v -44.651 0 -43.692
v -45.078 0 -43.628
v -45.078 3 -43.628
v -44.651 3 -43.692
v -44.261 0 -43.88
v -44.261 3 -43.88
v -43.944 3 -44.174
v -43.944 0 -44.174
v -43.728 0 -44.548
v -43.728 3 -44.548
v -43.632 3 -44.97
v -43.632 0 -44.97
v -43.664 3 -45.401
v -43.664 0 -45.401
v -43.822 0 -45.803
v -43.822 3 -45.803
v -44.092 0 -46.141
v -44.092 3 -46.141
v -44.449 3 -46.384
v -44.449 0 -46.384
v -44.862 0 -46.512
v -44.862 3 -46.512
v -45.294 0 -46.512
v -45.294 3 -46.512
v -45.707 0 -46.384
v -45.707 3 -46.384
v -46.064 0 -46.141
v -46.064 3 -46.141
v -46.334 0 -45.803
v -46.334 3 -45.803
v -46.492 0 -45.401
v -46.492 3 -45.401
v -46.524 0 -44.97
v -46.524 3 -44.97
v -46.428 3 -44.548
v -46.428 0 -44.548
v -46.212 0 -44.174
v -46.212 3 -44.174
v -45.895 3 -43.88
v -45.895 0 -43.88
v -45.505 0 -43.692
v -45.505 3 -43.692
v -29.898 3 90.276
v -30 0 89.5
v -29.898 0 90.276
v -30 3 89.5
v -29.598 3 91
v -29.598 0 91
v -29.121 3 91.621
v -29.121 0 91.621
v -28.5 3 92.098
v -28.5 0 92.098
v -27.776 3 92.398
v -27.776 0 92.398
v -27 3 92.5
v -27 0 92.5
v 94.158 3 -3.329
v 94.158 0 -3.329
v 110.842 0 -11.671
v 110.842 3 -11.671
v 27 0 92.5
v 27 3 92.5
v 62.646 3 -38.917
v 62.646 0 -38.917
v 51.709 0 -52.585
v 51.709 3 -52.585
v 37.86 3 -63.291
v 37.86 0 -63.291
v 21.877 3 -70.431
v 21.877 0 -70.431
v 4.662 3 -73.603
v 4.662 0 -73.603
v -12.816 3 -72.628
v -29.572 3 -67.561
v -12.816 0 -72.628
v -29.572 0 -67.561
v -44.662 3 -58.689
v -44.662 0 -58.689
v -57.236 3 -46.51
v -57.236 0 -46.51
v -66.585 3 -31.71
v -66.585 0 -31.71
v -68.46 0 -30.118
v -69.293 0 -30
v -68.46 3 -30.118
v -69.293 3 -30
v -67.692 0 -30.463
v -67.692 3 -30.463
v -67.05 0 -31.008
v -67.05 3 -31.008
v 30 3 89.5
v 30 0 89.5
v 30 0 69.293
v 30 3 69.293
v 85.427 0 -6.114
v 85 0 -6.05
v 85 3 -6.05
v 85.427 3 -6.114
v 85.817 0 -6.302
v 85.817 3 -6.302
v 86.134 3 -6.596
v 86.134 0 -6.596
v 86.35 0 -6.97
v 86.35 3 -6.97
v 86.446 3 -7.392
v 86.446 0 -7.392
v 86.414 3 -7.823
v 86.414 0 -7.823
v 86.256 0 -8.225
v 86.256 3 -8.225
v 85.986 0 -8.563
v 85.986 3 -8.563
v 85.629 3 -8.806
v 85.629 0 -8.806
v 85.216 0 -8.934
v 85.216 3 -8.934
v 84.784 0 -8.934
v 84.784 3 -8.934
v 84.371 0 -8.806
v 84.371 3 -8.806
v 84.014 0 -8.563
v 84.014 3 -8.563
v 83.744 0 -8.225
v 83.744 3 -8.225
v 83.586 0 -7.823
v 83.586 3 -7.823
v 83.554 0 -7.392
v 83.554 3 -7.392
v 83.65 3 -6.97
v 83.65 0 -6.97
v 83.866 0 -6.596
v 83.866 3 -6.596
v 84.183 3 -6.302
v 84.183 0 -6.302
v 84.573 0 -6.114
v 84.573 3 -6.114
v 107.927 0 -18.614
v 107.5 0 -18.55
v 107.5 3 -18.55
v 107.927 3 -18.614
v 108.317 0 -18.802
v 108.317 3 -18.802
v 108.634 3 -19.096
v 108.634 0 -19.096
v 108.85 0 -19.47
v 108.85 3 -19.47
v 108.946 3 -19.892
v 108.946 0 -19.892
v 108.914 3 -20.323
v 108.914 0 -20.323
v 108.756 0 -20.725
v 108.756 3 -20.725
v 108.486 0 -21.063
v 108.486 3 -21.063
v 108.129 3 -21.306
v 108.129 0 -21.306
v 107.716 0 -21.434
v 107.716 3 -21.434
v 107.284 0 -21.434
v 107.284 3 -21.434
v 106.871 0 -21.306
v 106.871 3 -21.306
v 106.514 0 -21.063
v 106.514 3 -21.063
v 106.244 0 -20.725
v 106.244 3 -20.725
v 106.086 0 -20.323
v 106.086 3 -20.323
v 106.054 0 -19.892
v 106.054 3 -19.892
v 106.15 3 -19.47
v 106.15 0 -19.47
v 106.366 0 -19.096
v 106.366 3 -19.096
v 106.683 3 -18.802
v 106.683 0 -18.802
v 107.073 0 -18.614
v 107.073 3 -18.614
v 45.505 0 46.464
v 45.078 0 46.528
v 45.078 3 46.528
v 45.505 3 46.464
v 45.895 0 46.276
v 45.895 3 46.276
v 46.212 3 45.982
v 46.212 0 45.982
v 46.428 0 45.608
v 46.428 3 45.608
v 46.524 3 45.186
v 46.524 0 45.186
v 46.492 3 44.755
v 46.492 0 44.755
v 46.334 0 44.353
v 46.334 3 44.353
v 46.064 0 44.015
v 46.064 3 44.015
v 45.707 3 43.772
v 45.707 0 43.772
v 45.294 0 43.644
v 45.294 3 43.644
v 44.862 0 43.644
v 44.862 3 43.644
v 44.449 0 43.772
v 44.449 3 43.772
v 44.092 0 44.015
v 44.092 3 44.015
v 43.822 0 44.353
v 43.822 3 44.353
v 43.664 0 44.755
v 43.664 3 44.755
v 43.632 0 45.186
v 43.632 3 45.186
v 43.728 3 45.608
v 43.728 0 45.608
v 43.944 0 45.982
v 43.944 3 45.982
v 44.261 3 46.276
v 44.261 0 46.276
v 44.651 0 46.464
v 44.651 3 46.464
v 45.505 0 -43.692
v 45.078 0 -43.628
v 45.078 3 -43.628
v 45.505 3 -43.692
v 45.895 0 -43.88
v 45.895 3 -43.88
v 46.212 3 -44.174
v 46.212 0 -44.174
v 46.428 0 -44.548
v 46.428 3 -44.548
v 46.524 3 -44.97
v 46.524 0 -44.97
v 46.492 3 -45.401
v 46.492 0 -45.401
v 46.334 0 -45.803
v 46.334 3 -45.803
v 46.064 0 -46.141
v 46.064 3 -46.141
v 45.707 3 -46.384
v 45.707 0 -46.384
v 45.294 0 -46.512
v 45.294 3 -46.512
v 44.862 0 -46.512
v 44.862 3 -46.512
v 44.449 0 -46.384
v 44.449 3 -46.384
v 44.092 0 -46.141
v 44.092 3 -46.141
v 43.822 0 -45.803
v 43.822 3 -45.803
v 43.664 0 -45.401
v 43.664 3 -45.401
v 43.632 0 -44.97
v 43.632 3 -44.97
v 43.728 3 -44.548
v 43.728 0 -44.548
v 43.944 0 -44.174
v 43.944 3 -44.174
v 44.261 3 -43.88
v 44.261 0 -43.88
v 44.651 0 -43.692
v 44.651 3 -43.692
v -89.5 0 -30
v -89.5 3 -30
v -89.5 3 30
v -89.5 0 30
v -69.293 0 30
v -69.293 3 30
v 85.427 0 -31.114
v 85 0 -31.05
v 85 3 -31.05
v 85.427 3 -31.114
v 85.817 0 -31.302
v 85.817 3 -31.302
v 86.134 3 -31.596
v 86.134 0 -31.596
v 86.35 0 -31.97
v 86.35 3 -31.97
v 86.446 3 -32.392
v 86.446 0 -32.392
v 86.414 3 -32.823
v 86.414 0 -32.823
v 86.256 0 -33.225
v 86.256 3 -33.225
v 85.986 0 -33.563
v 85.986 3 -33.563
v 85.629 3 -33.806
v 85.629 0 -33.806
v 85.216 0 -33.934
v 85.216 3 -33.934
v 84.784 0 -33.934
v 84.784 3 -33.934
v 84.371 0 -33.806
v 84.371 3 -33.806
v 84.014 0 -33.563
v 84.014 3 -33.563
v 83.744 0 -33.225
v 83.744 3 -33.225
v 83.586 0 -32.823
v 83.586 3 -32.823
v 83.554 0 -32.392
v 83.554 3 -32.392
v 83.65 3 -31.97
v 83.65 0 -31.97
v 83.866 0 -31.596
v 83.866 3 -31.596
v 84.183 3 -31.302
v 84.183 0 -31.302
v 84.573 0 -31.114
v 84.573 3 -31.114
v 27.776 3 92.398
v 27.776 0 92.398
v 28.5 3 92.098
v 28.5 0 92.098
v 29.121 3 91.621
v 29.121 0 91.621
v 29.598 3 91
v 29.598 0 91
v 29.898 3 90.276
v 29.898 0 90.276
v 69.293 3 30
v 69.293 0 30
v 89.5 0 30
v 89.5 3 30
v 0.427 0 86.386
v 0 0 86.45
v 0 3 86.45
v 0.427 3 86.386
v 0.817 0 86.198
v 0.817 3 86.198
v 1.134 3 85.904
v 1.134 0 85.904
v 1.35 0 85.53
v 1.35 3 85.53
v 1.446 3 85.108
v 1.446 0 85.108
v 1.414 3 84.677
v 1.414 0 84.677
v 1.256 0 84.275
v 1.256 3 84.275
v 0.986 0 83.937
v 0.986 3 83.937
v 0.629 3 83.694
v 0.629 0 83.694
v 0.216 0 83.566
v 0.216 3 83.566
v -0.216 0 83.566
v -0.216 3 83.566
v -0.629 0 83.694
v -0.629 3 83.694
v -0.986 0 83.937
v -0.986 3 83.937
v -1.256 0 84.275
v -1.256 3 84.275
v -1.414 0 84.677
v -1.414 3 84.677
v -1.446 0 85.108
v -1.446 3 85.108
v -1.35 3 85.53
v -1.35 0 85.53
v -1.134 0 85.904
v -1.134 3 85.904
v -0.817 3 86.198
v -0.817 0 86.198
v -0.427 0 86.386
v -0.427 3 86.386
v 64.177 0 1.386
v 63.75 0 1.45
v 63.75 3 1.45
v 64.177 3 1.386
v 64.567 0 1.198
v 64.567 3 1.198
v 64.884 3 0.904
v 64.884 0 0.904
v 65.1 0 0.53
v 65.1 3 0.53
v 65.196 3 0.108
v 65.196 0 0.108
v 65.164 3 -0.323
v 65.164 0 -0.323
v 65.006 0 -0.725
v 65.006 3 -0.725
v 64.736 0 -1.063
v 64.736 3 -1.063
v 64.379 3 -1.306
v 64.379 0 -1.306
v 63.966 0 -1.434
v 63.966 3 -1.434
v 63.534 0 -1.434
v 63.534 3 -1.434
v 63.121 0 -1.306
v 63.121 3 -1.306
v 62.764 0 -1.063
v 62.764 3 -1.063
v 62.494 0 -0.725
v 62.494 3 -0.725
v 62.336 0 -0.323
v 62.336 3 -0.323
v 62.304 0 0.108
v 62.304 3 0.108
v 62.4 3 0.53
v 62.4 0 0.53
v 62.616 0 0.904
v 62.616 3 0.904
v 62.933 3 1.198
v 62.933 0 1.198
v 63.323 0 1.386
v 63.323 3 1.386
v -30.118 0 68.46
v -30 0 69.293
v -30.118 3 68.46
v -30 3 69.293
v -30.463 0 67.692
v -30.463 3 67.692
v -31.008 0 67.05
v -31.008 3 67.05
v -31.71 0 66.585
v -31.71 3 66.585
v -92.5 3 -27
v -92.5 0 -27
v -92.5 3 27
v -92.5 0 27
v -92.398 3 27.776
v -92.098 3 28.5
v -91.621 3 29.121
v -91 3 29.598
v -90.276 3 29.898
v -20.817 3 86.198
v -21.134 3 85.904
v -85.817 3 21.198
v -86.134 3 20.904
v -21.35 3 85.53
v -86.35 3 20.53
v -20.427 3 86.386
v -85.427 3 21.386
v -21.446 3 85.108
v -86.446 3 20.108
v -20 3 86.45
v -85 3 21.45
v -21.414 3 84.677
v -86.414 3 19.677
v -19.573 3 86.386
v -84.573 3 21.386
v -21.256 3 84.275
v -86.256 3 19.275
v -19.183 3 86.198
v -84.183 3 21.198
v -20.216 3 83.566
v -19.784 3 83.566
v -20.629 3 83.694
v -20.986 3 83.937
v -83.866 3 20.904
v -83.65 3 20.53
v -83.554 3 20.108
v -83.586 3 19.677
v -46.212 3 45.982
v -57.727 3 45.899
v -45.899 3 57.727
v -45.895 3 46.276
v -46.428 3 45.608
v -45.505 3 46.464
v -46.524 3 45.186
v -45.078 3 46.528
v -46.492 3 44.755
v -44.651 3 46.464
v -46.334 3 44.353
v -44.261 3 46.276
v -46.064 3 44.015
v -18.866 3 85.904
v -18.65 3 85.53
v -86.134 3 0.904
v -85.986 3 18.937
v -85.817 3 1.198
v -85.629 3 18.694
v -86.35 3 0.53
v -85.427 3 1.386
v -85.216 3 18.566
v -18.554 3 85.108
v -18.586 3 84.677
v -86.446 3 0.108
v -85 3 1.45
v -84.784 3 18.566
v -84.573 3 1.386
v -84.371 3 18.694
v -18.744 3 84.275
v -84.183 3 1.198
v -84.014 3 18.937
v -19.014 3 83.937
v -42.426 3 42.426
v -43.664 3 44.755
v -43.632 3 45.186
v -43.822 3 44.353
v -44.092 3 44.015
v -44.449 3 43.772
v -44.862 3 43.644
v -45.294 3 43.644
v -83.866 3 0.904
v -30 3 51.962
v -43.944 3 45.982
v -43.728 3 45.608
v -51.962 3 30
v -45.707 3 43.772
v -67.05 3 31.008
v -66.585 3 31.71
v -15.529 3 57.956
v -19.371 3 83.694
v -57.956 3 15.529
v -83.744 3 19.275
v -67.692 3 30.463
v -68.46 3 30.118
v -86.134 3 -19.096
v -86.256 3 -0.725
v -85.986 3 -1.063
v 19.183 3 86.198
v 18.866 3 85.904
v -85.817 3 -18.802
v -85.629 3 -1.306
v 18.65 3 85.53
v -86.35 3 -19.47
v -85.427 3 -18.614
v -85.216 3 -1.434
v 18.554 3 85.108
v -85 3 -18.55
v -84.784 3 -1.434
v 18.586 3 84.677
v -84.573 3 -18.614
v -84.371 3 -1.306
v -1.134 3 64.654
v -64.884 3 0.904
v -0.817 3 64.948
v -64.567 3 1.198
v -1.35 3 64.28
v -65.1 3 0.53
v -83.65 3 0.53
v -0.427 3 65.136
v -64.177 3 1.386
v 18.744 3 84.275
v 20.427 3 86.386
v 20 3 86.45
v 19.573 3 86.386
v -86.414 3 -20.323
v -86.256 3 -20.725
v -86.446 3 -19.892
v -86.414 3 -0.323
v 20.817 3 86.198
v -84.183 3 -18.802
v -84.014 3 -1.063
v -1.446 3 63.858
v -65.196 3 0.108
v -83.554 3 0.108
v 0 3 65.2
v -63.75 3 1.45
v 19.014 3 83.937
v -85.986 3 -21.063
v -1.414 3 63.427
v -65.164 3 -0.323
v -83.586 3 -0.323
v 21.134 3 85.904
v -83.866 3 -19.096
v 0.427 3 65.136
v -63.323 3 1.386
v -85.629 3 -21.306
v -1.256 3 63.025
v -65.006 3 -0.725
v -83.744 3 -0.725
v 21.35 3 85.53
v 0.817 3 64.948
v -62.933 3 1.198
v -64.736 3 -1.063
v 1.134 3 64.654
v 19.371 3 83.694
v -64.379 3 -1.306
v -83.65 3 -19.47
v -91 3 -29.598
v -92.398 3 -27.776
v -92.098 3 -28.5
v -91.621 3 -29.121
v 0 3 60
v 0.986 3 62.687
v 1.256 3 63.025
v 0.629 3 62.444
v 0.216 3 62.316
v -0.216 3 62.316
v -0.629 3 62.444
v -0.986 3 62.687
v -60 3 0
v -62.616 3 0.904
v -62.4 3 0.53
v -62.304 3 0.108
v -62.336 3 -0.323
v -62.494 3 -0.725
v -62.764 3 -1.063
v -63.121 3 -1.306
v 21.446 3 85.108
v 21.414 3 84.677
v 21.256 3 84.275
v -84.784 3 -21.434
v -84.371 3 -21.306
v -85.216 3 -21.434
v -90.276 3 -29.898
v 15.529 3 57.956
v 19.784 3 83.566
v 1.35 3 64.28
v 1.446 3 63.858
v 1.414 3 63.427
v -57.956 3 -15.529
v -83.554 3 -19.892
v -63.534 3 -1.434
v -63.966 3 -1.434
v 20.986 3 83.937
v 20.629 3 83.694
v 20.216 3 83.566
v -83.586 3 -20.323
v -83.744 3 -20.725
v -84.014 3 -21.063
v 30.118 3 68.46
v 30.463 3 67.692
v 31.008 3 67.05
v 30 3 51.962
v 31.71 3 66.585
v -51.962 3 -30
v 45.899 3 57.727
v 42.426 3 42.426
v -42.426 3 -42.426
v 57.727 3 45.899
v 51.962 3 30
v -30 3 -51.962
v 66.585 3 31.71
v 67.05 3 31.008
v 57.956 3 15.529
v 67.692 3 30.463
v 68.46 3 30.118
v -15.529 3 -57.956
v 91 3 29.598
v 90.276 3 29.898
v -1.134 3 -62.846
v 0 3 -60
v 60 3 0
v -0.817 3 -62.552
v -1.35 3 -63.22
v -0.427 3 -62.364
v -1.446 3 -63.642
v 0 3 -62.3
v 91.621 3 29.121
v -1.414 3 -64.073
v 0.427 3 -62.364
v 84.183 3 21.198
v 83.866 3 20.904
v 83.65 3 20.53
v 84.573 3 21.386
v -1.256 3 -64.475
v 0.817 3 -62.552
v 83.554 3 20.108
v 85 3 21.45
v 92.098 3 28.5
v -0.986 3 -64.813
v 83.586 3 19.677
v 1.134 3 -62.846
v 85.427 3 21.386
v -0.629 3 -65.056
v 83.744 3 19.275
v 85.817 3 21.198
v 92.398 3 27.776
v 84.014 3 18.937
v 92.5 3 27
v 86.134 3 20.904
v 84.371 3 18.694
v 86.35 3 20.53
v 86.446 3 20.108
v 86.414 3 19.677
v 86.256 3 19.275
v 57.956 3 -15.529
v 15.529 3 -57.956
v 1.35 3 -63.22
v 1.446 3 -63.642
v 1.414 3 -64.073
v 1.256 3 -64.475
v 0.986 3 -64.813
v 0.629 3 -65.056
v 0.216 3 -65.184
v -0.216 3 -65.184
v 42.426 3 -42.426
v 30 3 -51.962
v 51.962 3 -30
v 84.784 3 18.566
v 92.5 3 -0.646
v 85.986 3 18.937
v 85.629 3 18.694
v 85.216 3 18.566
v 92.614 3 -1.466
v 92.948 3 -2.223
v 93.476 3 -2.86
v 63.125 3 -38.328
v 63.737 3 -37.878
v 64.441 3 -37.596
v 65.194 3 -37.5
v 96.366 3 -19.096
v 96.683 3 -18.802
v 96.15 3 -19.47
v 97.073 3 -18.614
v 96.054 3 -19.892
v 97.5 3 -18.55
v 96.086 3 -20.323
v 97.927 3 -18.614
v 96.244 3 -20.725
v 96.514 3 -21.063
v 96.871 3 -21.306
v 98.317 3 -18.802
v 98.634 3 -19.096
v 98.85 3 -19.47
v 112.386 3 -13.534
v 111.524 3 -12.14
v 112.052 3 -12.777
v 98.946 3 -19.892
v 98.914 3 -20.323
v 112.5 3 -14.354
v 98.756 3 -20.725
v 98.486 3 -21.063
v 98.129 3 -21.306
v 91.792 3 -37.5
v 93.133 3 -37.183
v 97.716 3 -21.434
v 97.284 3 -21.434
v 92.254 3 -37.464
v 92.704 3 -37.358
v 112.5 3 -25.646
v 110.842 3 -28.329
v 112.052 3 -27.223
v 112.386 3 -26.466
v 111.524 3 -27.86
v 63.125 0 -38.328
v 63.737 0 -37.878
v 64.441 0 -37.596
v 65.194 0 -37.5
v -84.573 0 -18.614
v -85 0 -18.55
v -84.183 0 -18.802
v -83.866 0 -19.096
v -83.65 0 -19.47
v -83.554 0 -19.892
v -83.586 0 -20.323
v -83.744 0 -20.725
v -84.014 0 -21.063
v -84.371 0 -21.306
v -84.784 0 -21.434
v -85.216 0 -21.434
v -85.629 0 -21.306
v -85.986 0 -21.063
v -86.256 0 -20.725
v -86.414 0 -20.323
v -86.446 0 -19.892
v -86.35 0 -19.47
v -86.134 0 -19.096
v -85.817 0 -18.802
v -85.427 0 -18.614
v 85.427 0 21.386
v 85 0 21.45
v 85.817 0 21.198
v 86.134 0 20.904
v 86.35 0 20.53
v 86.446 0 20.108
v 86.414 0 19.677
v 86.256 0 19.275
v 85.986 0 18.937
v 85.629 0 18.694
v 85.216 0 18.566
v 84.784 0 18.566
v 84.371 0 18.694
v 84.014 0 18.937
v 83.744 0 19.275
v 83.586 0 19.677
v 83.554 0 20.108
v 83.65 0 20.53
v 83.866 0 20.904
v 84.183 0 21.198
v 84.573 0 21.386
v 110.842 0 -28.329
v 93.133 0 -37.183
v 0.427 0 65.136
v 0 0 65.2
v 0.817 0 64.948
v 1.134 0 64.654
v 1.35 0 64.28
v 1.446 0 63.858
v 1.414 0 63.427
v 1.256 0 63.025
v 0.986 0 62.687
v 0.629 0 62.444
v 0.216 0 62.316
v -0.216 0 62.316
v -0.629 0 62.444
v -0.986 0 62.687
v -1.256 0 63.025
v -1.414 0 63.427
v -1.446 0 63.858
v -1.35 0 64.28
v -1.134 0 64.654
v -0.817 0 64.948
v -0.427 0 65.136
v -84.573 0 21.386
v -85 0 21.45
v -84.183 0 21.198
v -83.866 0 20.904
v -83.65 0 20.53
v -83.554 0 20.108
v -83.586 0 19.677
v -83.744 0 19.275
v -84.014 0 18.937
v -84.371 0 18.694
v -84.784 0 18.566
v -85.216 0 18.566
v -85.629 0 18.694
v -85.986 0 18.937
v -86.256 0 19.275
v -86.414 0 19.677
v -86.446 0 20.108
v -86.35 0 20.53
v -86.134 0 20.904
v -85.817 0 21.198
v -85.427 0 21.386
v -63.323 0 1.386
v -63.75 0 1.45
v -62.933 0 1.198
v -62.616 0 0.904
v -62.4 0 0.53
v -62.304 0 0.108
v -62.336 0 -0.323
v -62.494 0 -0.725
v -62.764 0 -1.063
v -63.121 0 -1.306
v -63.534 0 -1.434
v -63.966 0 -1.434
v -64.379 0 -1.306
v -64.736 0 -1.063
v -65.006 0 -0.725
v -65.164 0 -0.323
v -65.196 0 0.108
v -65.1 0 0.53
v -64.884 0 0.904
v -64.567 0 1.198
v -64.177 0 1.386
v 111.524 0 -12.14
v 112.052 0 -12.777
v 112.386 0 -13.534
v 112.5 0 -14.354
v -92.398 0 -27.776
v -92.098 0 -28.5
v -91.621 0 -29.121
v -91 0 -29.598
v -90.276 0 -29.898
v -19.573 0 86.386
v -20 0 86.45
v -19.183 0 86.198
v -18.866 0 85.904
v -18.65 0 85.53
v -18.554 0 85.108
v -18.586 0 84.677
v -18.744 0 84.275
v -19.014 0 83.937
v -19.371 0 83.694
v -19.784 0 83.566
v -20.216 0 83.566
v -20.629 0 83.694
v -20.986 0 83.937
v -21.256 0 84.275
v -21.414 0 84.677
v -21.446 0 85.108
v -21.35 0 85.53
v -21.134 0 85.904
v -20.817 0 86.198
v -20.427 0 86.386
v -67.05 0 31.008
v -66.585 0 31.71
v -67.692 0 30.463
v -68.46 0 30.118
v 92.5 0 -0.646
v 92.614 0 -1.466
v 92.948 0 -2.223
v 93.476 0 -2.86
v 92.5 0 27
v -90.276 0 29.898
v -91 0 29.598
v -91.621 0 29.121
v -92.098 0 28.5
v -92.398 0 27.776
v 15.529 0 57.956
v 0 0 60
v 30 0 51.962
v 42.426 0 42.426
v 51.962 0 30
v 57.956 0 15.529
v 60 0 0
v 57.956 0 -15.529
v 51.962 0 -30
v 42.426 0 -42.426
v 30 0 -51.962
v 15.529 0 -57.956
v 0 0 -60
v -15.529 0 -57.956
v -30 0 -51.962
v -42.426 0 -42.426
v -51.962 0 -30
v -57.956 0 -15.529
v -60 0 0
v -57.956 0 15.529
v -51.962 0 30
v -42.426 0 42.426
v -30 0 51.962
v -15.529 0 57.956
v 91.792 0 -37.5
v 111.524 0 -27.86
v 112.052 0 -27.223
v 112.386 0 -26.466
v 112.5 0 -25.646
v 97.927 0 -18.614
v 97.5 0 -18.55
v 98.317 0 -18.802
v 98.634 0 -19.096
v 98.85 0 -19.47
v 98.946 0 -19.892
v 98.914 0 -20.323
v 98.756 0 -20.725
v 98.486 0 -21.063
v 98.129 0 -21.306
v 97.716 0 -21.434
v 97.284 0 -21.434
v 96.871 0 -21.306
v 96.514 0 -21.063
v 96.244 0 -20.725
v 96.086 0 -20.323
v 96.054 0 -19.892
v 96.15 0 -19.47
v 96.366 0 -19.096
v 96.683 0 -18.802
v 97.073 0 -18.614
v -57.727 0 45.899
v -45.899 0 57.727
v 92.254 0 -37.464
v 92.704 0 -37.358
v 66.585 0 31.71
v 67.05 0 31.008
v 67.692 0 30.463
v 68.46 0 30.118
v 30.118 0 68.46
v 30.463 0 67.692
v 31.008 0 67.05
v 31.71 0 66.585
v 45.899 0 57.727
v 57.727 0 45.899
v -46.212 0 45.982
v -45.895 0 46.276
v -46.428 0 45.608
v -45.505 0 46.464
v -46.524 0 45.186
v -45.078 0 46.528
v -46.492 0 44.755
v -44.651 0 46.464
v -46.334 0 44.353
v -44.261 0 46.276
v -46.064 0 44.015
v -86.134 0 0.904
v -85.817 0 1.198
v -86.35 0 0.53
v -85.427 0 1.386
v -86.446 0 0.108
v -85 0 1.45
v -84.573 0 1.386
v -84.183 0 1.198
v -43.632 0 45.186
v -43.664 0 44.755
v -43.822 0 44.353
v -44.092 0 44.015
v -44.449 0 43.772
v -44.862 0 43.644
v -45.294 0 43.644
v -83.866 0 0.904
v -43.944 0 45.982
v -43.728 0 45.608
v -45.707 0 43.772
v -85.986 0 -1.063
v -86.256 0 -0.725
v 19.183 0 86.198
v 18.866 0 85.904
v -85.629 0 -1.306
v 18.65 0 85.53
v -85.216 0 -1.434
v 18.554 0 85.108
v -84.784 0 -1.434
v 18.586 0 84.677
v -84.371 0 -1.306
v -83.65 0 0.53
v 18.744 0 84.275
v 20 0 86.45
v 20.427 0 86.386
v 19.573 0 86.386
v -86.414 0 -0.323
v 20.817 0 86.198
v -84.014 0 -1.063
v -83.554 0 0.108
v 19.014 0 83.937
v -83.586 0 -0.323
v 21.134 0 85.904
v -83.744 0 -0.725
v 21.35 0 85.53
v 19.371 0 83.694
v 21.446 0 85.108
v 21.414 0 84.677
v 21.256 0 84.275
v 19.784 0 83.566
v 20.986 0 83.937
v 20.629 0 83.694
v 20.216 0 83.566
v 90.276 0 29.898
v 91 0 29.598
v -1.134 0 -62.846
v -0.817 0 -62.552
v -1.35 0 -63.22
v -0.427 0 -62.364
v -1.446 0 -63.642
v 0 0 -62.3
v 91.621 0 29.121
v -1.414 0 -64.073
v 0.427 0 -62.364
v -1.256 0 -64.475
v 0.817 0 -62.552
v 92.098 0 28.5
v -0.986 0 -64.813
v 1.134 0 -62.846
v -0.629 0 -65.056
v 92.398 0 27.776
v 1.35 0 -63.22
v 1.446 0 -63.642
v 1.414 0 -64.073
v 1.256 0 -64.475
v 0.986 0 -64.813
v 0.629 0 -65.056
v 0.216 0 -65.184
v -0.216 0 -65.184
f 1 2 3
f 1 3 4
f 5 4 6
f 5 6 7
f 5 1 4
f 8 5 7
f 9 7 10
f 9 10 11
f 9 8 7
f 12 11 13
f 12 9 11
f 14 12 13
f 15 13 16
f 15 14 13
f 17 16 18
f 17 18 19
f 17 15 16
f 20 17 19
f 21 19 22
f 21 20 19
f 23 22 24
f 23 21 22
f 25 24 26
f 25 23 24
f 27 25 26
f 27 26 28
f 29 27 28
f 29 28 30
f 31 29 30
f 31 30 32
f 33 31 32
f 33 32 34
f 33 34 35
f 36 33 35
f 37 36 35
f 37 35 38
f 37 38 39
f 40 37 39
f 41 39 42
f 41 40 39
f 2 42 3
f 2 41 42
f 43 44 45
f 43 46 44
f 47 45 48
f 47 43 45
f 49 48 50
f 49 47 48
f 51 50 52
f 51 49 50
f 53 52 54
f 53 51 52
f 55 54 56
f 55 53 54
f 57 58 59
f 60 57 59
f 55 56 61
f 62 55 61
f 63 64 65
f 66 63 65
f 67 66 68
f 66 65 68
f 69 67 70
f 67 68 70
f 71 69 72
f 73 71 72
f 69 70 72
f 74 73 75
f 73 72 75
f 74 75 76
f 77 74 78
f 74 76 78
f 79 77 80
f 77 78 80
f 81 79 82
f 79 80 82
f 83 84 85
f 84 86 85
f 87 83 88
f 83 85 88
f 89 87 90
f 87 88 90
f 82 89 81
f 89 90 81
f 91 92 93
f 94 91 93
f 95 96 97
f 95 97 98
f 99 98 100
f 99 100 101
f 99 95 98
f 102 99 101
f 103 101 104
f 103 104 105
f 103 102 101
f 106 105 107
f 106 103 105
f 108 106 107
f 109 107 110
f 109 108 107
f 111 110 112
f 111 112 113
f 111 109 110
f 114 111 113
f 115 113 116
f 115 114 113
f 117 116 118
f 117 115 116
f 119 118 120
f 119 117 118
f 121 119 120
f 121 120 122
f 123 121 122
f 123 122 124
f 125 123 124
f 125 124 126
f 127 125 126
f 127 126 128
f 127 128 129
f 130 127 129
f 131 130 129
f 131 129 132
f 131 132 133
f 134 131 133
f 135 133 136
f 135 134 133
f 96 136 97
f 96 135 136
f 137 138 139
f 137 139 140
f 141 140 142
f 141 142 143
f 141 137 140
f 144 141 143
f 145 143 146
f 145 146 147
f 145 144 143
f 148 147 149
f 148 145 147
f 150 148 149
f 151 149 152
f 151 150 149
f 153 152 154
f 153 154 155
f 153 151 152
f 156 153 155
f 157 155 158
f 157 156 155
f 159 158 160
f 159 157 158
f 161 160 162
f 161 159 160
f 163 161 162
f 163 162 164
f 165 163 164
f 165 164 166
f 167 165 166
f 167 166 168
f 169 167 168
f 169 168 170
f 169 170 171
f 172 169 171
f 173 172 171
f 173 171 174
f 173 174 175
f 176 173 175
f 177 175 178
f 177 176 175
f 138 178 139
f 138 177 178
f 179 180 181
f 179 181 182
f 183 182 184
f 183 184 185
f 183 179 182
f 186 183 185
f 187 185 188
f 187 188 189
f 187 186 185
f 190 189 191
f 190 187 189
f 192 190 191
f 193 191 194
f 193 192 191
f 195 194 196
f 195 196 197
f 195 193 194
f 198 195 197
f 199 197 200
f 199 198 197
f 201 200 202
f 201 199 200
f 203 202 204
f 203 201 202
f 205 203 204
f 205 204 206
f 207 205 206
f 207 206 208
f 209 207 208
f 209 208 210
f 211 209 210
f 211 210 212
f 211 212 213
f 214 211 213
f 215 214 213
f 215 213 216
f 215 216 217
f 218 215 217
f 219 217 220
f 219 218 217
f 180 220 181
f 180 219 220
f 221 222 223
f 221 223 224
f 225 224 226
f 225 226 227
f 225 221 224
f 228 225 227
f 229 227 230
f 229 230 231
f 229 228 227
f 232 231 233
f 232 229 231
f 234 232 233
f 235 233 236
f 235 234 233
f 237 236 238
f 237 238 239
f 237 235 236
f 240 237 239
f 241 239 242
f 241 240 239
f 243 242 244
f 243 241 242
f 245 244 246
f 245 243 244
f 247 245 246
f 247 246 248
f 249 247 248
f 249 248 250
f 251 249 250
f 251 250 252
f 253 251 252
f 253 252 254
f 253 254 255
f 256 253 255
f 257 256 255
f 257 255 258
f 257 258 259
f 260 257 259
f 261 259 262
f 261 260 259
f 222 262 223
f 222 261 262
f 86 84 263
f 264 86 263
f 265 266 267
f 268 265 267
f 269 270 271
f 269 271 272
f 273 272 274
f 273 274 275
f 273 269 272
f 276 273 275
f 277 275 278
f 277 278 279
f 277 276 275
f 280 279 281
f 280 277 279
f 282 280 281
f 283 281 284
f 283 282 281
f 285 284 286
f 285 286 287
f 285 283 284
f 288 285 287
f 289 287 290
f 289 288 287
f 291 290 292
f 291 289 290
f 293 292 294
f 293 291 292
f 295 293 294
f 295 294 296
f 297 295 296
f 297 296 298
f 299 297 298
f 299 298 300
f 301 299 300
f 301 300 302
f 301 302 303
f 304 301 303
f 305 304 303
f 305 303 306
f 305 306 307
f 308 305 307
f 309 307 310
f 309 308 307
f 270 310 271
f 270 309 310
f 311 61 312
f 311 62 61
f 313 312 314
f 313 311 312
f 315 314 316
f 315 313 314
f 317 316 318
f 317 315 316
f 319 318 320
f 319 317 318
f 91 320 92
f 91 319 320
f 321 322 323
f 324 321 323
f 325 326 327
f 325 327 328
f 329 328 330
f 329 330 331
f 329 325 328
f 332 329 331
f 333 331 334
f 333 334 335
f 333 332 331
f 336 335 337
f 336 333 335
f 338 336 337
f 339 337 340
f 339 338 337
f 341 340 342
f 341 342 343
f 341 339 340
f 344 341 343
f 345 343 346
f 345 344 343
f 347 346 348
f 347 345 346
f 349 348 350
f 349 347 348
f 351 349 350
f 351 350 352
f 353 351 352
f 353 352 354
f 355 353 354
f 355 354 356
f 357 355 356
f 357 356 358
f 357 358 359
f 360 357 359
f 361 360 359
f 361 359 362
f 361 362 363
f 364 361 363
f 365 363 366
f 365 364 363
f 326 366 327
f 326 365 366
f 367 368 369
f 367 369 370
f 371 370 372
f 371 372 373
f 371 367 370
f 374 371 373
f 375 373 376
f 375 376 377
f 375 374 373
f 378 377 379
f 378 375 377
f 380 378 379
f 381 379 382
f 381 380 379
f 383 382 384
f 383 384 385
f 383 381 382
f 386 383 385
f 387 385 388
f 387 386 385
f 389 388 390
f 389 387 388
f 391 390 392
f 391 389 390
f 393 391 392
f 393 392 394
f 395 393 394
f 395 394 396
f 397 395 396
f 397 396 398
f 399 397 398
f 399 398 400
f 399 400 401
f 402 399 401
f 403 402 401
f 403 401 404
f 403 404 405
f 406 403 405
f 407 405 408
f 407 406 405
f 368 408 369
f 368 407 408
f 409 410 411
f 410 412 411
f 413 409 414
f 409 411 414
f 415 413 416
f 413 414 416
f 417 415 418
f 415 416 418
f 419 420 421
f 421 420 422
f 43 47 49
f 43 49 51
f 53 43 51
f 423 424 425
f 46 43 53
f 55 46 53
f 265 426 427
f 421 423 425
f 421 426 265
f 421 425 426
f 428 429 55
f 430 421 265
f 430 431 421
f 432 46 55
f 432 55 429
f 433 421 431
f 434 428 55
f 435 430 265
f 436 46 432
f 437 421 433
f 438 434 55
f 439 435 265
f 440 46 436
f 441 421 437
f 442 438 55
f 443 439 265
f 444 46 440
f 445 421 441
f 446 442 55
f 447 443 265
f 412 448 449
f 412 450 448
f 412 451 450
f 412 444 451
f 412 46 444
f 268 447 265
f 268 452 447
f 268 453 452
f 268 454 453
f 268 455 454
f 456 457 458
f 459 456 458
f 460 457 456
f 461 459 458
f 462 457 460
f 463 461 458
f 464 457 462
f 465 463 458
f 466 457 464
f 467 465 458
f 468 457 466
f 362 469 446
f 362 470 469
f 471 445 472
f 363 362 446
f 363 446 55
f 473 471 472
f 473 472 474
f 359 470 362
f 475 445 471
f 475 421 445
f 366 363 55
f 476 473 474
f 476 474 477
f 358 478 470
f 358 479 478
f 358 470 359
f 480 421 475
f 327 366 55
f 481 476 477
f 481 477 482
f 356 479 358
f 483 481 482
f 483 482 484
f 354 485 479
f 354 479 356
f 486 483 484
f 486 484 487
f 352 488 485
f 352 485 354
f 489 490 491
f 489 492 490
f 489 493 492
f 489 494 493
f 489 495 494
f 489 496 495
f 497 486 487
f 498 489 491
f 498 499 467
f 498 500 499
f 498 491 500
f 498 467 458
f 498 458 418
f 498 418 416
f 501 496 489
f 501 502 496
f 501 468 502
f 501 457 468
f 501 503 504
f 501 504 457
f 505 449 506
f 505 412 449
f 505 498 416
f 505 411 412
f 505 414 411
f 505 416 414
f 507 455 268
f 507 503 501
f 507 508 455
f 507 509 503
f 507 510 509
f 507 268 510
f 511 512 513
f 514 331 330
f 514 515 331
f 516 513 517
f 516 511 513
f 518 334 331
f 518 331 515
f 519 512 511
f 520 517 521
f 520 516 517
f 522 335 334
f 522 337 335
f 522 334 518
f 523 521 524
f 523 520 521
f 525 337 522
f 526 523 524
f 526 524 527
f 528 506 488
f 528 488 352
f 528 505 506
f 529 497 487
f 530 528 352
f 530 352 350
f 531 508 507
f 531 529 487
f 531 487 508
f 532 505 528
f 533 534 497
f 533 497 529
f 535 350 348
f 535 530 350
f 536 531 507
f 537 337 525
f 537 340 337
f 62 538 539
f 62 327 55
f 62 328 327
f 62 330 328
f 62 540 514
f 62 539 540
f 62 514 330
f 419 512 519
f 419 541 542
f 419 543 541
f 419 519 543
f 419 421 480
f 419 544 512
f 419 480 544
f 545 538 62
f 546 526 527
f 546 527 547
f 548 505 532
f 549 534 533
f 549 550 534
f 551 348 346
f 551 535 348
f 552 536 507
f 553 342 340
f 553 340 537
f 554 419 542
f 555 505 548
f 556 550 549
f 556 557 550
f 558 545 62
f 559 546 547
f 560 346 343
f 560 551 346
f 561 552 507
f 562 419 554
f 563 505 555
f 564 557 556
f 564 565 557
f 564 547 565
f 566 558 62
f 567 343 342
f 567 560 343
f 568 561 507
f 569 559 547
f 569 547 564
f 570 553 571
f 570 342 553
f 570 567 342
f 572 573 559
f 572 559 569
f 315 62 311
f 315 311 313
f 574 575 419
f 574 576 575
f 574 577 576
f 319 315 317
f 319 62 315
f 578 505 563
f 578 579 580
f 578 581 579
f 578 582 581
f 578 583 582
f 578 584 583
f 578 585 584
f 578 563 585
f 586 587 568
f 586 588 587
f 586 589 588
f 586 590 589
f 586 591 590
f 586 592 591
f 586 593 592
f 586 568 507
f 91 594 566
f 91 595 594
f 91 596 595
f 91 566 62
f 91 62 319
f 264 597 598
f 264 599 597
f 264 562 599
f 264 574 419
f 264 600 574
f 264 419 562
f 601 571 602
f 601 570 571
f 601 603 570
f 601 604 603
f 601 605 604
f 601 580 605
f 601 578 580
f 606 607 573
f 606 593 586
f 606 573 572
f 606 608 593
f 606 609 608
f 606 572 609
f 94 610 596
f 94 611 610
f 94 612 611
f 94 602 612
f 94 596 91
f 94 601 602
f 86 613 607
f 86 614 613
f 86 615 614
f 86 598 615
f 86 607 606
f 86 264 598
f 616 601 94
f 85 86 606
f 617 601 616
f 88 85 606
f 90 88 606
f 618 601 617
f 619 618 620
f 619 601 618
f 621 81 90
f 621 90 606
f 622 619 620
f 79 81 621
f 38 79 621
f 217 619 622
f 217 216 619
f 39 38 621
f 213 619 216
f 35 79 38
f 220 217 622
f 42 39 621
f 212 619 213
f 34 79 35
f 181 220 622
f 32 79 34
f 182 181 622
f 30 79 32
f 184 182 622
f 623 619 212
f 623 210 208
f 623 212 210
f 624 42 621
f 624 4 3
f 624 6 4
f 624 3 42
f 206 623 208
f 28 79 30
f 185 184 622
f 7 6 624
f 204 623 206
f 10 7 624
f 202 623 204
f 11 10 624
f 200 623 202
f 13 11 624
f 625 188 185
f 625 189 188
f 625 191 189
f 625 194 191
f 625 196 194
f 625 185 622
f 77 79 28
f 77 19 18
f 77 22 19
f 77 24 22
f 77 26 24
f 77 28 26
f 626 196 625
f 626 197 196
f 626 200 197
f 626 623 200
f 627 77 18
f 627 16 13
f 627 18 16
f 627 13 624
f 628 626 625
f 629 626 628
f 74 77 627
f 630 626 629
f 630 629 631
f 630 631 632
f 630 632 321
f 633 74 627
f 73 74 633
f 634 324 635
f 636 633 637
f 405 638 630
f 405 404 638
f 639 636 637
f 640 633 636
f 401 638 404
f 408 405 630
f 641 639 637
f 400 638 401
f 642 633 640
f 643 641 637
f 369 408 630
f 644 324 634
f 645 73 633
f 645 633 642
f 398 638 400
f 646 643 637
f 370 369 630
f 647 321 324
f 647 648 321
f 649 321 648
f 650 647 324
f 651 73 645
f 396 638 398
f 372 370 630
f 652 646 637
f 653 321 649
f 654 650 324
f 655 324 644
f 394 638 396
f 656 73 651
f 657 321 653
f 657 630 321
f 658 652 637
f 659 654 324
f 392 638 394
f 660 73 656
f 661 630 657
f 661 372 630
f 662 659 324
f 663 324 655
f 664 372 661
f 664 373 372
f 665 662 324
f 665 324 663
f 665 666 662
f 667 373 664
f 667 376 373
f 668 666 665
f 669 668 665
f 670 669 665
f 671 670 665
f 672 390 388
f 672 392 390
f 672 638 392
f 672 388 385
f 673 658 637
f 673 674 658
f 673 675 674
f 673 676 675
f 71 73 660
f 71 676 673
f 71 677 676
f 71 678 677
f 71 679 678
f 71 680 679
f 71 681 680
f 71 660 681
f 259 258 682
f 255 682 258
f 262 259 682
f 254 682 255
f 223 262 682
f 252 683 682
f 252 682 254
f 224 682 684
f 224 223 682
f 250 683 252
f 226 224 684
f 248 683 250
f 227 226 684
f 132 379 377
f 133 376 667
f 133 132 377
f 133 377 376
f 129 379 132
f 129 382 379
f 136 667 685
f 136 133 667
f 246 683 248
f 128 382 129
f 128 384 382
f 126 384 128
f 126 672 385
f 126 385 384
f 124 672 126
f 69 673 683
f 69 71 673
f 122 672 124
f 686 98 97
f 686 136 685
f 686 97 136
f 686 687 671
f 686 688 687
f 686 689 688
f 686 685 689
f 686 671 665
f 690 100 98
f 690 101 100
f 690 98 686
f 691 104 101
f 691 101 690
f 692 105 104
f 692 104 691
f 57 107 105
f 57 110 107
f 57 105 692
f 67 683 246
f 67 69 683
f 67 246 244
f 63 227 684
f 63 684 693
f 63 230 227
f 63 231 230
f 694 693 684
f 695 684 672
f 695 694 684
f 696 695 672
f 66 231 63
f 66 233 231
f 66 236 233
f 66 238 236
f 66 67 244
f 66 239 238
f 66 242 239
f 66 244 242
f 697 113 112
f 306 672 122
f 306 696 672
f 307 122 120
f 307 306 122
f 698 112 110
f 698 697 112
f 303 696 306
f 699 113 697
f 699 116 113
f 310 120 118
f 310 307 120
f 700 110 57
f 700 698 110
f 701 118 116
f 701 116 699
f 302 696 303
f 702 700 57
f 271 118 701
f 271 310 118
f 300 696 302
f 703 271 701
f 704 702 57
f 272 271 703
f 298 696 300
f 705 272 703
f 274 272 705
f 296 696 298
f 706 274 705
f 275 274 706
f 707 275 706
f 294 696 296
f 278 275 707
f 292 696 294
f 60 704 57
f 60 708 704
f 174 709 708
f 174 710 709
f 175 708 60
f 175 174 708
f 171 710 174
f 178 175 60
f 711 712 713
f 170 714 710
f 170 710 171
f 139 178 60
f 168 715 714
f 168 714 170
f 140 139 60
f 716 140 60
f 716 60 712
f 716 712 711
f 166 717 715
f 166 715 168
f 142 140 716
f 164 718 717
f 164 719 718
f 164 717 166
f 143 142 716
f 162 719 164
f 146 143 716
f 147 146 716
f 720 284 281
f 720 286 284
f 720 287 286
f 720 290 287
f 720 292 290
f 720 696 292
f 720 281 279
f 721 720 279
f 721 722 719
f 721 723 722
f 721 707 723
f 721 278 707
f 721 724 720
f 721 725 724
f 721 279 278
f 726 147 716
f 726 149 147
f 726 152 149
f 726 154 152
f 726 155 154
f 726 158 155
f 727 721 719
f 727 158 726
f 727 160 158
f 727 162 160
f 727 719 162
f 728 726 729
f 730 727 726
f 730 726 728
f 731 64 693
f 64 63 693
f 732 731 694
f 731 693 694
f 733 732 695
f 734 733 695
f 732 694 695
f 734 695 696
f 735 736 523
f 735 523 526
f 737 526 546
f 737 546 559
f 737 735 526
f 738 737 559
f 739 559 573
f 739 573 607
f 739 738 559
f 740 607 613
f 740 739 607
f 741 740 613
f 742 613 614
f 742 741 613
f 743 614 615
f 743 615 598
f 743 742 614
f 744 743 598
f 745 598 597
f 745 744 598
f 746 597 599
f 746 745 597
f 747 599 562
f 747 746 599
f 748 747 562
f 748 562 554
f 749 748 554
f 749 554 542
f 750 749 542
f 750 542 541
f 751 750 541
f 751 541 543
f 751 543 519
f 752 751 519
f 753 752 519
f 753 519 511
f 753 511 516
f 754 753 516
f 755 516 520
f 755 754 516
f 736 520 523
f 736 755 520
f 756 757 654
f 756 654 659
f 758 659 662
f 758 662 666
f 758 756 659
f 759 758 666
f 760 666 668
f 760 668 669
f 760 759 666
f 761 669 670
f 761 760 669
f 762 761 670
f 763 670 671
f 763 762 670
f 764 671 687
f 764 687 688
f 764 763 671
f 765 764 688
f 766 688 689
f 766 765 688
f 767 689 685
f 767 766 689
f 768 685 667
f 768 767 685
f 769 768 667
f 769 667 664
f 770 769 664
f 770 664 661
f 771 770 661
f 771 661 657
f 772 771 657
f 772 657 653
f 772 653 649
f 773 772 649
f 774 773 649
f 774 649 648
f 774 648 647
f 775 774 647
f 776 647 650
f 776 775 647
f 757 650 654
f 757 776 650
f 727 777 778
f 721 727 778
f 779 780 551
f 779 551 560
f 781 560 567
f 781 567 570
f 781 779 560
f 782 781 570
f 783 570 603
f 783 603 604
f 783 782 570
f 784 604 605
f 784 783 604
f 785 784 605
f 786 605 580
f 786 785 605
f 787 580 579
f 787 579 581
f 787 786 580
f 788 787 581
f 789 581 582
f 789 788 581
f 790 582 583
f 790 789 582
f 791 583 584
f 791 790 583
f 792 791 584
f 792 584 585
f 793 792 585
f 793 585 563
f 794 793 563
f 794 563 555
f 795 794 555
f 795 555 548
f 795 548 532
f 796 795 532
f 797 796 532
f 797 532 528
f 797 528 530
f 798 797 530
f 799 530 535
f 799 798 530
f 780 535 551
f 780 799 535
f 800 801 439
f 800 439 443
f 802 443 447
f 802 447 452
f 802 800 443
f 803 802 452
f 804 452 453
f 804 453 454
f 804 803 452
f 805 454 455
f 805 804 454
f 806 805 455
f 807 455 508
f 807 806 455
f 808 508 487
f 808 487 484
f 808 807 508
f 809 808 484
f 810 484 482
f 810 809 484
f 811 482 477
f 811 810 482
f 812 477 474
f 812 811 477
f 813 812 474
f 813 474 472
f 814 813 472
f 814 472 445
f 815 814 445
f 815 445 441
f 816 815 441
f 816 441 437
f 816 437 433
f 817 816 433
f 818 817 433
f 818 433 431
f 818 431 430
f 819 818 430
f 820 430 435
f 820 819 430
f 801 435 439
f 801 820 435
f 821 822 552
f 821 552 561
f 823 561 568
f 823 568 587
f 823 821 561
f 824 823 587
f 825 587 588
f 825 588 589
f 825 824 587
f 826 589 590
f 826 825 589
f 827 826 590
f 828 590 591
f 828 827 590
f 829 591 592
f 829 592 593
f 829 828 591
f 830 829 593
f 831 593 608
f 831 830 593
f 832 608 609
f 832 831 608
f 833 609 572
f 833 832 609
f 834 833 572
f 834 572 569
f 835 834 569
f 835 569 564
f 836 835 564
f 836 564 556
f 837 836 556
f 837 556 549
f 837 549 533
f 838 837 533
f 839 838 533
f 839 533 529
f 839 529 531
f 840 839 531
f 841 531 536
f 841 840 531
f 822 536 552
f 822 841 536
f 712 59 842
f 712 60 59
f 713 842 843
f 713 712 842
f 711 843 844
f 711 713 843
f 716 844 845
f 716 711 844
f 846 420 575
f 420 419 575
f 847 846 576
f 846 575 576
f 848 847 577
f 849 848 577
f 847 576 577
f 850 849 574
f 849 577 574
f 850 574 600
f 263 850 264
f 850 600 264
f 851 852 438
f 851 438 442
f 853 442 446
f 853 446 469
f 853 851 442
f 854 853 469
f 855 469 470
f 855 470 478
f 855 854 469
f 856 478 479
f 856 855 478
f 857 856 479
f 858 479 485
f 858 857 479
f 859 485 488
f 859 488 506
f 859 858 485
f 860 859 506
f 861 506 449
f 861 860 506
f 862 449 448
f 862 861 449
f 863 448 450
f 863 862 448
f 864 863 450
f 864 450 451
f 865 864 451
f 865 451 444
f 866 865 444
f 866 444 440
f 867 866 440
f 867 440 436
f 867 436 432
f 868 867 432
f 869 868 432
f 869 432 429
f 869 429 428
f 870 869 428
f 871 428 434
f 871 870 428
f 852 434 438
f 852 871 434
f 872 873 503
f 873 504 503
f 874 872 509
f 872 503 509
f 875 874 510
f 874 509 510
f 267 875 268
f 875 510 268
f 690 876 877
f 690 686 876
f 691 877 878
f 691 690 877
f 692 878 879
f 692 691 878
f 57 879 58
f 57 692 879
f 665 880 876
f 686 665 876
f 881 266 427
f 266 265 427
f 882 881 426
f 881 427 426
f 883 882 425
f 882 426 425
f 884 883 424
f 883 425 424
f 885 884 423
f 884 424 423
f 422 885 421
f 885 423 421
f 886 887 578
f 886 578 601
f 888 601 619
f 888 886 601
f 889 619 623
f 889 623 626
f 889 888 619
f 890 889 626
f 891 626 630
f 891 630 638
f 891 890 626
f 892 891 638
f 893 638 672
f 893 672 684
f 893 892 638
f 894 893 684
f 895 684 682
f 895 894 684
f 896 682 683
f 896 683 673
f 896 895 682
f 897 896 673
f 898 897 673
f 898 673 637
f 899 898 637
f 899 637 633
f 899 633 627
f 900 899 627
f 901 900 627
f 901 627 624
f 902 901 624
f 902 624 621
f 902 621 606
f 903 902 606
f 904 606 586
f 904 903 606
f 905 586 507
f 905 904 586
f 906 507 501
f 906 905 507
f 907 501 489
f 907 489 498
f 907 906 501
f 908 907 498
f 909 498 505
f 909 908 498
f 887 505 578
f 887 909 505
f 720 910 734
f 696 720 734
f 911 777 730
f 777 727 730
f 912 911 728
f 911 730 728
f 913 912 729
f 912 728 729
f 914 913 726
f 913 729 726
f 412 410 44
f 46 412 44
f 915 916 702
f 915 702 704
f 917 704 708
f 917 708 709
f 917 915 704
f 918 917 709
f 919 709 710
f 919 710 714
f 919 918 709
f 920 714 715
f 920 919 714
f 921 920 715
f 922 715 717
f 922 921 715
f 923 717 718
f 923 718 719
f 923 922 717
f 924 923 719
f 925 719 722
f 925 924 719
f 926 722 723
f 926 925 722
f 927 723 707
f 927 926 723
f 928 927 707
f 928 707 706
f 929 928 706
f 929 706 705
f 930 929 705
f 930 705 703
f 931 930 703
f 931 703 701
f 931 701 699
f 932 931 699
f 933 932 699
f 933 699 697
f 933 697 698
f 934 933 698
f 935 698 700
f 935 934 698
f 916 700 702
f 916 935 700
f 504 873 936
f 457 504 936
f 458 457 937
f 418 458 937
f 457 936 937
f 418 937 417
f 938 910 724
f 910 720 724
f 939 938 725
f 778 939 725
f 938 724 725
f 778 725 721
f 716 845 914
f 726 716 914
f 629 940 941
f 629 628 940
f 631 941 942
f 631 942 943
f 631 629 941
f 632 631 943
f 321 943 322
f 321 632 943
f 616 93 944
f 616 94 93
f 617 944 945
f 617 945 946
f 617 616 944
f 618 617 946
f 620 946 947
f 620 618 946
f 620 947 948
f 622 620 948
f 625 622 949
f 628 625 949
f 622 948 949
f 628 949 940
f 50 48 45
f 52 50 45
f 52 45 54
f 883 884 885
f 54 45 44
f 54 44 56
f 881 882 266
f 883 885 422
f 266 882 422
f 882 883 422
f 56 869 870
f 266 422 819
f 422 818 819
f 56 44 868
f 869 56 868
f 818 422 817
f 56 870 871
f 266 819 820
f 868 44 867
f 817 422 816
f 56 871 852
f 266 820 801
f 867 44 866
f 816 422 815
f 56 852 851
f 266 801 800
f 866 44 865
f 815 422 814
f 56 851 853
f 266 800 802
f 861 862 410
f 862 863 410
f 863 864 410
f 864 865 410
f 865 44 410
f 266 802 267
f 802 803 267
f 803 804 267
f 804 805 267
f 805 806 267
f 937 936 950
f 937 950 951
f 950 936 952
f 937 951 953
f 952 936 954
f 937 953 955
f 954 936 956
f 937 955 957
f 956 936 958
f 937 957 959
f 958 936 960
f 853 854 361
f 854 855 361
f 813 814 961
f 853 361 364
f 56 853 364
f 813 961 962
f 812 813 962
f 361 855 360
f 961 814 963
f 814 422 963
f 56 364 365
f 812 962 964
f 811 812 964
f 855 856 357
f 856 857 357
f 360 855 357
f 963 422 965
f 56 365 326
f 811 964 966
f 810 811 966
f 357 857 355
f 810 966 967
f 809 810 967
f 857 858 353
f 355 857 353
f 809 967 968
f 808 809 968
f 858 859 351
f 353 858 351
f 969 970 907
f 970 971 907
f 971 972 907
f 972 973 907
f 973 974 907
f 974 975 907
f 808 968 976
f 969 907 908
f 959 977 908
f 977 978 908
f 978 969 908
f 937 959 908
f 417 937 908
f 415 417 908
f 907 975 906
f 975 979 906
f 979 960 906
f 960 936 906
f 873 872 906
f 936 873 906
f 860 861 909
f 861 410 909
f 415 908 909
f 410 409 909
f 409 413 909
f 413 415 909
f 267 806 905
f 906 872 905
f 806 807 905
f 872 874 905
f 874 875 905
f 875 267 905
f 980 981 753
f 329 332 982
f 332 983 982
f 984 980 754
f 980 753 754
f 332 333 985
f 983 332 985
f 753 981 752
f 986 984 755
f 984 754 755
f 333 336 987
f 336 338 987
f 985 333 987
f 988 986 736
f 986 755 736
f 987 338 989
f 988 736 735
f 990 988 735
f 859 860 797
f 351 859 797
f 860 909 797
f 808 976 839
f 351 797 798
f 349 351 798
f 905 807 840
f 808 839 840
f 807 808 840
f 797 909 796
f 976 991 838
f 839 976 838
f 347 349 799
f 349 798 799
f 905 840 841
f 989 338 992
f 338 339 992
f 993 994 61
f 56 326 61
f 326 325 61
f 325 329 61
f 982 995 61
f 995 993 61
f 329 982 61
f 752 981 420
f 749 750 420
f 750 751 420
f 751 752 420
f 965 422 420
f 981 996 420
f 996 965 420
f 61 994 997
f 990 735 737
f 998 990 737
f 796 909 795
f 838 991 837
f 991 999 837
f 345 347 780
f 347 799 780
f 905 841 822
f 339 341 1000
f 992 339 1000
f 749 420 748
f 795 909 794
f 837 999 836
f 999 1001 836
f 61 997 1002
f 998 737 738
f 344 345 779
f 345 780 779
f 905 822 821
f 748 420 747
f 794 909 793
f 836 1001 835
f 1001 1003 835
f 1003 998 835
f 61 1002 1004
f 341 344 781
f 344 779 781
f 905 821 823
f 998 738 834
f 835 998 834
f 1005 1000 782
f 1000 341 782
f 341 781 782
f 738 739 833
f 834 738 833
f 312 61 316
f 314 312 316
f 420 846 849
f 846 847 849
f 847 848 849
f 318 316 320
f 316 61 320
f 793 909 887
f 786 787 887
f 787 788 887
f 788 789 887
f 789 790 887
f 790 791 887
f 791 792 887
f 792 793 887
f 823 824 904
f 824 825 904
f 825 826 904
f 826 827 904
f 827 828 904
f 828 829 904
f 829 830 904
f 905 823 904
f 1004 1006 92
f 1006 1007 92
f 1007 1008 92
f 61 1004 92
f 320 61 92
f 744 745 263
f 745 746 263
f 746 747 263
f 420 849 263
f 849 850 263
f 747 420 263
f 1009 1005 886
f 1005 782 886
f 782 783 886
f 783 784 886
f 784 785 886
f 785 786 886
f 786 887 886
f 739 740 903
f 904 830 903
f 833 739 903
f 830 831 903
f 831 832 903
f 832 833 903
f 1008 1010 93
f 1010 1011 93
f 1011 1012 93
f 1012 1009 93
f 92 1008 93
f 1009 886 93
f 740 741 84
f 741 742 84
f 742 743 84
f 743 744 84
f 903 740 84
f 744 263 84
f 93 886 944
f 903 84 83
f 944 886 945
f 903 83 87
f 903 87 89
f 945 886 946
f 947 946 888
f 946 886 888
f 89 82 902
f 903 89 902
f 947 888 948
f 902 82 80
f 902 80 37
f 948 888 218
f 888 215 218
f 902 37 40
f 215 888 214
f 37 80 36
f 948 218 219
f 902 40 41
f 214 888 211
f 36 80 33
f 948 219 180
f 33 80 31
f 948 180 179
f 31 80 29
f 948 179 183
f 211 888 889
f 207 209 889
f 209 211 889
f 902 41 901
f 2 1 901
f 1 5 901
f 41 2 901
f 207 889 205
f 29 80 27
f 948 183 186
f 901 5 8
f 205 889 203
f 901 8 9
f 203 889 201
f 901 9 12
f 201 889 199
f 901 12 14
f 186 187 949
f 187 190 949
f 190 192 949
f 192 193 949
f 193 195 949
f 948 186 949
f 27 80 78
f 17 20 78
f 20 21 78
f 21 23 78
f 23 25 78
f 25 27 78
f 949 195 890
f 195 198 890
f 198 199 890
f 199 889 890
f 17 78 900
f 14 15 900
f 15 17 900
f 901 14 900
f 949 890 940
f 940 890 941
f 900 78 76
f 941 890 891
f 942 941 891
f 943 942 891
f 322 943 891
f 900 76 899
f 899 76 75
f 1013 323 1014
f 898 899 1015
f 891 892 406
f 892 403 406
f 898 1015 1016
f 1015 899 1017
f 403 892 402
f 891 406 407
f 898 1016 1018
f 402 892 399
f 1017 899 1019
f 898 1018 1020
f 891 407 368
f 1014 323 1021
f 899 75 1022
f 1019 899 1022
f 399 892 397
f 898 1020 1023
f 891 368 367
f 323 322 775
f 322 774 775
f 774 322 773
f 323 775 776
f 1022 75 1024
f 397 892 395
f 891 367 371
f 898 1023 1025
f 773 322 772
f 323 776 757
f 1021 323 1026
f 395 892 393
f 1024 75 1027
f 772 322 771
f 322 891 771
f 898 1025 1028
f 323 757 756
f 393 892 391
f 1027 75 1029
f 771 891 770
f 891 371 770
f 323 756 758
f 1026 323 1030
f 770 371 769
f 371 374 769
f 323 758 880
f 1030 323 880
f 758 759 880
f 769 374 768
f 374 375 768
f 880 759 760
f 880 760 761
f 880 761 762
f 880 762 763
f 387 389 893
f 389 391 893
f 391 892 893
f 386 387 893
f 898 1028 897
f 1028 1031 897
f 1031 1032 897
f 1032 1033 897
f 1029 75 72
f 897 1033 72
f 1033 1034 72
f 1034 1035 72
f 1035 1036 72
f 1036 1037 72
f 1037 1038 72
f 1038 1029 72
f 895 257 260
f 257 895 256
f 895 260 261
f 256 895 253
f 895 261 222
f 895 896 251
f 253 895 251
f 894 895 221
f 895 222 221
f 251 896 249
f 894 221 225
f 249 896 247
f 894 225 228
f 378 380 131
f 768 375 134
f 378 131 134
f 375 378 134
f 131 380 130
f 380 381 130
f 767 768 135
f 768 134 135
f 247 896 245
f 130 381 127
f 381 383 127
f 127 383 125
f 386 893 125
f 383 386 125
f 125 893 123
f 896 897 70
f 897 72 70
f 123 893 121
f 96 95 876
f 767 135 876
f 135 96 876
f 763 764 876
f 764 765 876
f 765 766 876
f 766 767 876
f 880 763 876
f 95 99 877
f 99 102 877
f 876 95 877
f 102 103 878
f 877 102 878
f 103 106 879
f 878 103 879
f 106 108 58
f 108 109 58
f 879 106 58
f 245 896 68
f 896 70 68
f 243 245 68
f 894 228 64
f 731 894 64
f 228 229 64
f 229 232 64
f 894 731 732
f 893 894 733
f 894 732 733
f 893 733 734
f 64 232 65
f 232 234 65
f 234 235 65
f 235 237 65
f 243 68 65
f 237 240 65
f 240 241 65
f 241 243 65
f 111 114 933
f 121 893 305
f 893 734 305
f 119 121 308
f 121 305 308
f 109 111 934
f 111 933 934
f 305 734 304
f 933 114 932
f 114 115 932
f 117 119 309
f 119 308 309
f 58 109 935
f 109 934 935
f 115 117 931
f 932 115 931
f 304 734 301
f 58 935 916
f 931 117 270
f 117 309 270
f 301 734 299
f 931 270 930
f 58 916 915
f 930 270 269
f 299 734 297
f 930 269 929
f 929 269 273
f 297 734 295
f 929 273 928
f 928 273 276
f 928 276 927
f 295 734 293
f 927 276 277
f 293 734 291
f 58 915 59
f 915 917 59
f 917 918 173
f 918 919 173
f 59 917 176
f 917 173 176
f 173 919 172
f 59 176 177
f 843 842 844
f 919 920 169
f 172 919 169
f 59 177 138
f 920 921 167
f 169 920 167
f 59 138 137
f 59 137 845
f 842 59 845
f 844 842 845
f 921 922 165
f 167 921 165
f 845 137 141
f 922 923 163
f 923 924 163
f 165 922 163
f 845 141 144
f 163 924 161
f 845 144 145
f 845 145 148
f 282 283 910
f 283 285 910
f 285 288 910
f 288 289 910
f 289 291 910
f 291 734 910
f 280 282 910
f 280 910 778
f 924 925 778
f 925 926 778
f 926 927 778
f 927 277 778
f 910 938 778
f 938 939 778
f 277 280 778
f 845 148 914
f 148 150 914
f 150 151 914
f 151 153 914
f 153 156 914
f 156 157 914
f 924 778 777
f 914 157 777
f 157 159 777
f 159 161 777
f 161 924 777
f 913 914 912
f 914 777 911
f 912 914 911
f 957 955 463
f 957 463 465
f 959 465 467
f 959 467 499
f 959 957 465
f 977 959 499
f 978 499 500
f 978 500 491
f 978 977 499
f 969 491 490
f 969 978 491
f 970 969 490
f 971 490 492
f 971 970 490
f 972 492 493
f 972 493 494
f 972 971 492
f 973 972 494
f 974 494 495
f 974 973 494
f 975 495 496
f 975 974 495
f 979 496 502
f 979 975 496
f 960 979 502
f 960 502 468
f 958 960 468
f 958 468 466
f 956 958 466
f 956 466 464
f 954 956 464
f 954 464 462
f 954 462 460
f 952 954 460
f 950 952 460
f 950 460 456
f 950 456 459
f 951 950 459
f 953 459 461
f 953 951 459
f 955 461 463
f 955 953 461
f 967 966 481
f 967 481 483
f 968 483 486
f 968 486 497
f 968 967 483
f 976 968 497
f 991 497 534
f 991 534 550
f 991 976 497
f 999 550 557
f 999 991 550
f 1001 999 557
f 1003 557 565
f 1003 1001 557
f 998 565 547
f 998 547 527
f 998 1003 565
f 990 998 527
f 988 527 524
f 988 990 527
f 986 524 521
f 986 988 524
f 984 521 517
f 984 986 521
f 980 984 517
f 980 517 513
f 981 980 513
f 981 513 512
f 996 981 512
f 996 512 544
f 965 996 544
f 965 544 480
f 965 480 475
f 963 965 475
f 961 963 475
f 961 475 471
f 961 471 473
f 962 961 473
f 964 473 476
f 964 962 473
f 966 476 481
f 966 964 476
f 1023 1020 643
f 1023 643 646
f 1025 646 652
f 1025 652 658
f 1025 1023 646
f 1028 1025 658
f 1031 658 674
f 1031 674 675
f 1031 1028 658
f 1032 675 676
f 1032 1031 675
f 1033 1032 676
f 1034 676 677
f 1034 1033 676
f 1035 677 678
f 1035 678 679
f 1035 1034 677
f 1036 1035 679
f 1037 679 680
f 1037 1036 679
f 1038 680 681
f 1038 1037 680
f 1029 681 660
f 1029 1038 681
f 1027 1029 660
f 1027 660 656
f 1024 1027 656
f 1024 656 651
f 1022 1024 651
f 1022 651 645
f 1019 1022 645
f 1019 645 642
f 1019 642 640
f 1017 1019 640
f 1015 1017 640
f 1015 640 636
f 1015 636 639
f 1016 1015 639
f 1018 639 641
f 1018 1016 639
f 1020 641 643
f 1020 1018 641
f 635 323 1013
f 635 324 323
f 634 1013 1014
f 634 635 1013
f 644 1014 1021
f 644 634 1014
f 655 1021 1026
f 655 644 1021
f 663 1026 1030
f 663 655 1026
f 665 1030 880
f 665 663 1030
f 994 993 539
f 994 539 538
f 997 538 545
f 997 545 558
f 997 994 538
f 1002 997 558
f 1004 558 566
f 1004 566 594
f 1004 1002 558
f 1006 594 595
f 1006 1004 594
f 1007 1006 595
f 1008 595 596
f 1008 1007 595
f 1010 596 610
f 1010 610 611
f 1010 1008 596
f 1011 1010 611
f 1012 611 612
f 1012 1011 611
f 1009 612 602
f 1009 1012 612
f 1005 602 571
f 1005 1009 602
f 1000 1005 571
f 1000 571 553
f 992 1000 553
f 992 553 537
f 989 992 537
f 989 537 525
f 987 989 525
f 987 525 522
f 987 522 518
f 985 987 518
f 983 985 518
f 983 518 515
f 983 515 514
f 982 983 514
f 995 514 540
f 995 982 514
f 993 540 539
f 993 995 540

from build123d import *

# Parameters (mm, degrees)
SKETCH_1_R      = 1.45
SKETCH_1_R_2    = 60
EXTRUDE_1_DEPTH = 3
FILLET_2_R      = 3


with BuildPart() as part:
    # 草图1 → 凸台-拉伸1 (new body)
    with BuildSketch(Plane(origin=(0, 0, 0), x_dir=(1, 0, 0), z_dir=(0, 1, 0))):
        with BuildLine():
            Line((-30, -67.372564891), (-30, -92.5))
            Line((-30, -92.5), (30, -92.5))
            Line((30, -92.5), (30, -67.372564891))
            ThreePointArc((30, -67.372564891), (52.149125113, -52.149125113), (67.372564891, -30))
            Line((67.372564891, -30), (92.5, -30))
            Line((92.5, -30), (92.5, 2.5))
            Line((92.5, 2.5), (112.5, 12.5))
            Line((112.5, 12.5), (112.5, 27.5))
            Line((112.5, 27.5), (92.5, 37.5))
            Line((92.5, 37.5), (63.504428979, 37.5))
            ThreePointArc((63.504428979, 37.5), (-4.219374226, 73.629201959), (-67.372564891, 30))
            Line((-67.372564891, 30), (-92.5, 30))
            Line((-92.5, 30), (-92.5, -30))
            Line((-92.5, -30), (-67.372564891, -30))
            ThreePointArc((-67.372564891, -30), (-52.149125113, -52.149125113), (-30, -67.372564891))
        make_face()
        with Locations(Location((-20, -85, 0), (0, 0, 270))):
            Circle(SKETCH_1_R, mode=Mode.SUBTRACT)
        with Locations(Location((0, -85, 0), (0, 0, 270))):
            Circle(SKETCH_1_R, mode=Mode.SUBTRACT)
        with Locations(Location((0, -63.75, 0), (0, 0, 270))):
            Circle(SKETCH_1_R, mode=Mode.SUBTRACT)
        with Locations(Location((-45.078057301, -45.078057301, 0), (0, 0, 270))):
            Circle(SKETCH_1_R, mode=Mode.SUBTRACT)
        with Locations(Location((-85, -20, 0), (0, 0, 270))):
            Circle(SKETCH_1_R, mode=Mode.SUBTRACT)
        with Locations(Location((20, -85, 0), (0, 0, 270))):
            Circle(SKETCH_1_R, mode=Mode.SUBTRACT)
        with Locations(Location((45.078057301, -45.078057301, 0), (0, 0, 270))):
            Circle(SKETCH_1_R, mode=Mode.SUBTRACT)
        with Locations(Location((85, -20, 0), (0, 0, 270))):
            Circle(SKETCH_1_R, mode=Mode.SUBTRACT)
        with Locations(Location((-85, 0, 0), (0, 0, 270))):
            Circle(SKETCH_1_R, mode=Mode.SUBTRACT)
        with Locations(Location((-63.75, 0, 0), (0, 0, 270))):
            Circle(SKETCH_1_R, mode=Mode.SUBTRACT)
        with Locations(Location((-85, 20, 0), (0, 0, 270))):
            Circle(SKETCH_1_R, mode=Mode.SUBTRACT)
        with Locations(Location((0, 0, 0), (0, 0, 270))):
            Circle(SKETCH_1_R_2, mode=Mode.SUBTRACT)
        with Locations(Location((-45.078057301, 45.078057301, 0), (0, 0, 270))):
            Circle(SKETCH_1_R, mode=Mode.SUBTRACT)
        with Locations(Location((0, 63.75, 0), (0, 0, 270))):
            Circle(SKETCH_1_R, mode=Mode.SUBTRACT)
        with Locations(Location((63.75, 0, 0), (0, 0, 270))):
            Circle(SKETCH_1_R, mode=Mode.SUBTRACT)
        with Locations(Location((85, 7.5, 0), (0, 0, 270))):
            Circle(SKETCH_1_R, mode=Mode.SUBTRACT)
        with Locations(Location((45.078057301, 45.078057301, 0), (0, 0, 270))):
            Circle(SKETCH_1_R, mode=Mode.SUBTRACT)
        with Locations(Location((85, 32.5, 0), (0, 0, 270))):
            Circle(SKETCH_1_R, mode=Mode.SUBTRACT)
        with Locations(Location((97.5, 20, 0), (0, 0, 270))):
            Circle(SKETCH_1_R, mode=Mode.SUBTRACT)
        with Locations(Location((107.5, 20, 0), (0, 0, 270))):
            Circle(SKETCH_1_R, mode=Mode.SUBTRACT)
    extrude(amount=EXTRUDE_1_DEPTH)

    # 圆角2
    fillet_2_edges = [part.edges().sort_by_distance(p)[0] for p in [
        (63.504428979, 1.5, -37.5),
        (92.5, 1.5, -37.5),
        (112.5, 1.5, -27.5),
        (112.5, 1.5, -12.5),
        (92.5, 1.5, -2.5),
        (92.5, 1.5, 30),
        (67.372564891, 1.5, 30),
        (30, 1.5, 67.372564891),
        (30, 1.5, 92.5),
        (-30, 1.5, 92.5),
        (-30, 1.5, 67.372564891),
        (-67.372564891, 1.5, 30),
        (-92.5, 1.5, 30),
        (-92.5, 1.5, -30),
        (-67.372564891, 1.5, -30),
    ]]
    fillet(fillet_2_edges, radius=FILLET_2_R)


solid = part.part
